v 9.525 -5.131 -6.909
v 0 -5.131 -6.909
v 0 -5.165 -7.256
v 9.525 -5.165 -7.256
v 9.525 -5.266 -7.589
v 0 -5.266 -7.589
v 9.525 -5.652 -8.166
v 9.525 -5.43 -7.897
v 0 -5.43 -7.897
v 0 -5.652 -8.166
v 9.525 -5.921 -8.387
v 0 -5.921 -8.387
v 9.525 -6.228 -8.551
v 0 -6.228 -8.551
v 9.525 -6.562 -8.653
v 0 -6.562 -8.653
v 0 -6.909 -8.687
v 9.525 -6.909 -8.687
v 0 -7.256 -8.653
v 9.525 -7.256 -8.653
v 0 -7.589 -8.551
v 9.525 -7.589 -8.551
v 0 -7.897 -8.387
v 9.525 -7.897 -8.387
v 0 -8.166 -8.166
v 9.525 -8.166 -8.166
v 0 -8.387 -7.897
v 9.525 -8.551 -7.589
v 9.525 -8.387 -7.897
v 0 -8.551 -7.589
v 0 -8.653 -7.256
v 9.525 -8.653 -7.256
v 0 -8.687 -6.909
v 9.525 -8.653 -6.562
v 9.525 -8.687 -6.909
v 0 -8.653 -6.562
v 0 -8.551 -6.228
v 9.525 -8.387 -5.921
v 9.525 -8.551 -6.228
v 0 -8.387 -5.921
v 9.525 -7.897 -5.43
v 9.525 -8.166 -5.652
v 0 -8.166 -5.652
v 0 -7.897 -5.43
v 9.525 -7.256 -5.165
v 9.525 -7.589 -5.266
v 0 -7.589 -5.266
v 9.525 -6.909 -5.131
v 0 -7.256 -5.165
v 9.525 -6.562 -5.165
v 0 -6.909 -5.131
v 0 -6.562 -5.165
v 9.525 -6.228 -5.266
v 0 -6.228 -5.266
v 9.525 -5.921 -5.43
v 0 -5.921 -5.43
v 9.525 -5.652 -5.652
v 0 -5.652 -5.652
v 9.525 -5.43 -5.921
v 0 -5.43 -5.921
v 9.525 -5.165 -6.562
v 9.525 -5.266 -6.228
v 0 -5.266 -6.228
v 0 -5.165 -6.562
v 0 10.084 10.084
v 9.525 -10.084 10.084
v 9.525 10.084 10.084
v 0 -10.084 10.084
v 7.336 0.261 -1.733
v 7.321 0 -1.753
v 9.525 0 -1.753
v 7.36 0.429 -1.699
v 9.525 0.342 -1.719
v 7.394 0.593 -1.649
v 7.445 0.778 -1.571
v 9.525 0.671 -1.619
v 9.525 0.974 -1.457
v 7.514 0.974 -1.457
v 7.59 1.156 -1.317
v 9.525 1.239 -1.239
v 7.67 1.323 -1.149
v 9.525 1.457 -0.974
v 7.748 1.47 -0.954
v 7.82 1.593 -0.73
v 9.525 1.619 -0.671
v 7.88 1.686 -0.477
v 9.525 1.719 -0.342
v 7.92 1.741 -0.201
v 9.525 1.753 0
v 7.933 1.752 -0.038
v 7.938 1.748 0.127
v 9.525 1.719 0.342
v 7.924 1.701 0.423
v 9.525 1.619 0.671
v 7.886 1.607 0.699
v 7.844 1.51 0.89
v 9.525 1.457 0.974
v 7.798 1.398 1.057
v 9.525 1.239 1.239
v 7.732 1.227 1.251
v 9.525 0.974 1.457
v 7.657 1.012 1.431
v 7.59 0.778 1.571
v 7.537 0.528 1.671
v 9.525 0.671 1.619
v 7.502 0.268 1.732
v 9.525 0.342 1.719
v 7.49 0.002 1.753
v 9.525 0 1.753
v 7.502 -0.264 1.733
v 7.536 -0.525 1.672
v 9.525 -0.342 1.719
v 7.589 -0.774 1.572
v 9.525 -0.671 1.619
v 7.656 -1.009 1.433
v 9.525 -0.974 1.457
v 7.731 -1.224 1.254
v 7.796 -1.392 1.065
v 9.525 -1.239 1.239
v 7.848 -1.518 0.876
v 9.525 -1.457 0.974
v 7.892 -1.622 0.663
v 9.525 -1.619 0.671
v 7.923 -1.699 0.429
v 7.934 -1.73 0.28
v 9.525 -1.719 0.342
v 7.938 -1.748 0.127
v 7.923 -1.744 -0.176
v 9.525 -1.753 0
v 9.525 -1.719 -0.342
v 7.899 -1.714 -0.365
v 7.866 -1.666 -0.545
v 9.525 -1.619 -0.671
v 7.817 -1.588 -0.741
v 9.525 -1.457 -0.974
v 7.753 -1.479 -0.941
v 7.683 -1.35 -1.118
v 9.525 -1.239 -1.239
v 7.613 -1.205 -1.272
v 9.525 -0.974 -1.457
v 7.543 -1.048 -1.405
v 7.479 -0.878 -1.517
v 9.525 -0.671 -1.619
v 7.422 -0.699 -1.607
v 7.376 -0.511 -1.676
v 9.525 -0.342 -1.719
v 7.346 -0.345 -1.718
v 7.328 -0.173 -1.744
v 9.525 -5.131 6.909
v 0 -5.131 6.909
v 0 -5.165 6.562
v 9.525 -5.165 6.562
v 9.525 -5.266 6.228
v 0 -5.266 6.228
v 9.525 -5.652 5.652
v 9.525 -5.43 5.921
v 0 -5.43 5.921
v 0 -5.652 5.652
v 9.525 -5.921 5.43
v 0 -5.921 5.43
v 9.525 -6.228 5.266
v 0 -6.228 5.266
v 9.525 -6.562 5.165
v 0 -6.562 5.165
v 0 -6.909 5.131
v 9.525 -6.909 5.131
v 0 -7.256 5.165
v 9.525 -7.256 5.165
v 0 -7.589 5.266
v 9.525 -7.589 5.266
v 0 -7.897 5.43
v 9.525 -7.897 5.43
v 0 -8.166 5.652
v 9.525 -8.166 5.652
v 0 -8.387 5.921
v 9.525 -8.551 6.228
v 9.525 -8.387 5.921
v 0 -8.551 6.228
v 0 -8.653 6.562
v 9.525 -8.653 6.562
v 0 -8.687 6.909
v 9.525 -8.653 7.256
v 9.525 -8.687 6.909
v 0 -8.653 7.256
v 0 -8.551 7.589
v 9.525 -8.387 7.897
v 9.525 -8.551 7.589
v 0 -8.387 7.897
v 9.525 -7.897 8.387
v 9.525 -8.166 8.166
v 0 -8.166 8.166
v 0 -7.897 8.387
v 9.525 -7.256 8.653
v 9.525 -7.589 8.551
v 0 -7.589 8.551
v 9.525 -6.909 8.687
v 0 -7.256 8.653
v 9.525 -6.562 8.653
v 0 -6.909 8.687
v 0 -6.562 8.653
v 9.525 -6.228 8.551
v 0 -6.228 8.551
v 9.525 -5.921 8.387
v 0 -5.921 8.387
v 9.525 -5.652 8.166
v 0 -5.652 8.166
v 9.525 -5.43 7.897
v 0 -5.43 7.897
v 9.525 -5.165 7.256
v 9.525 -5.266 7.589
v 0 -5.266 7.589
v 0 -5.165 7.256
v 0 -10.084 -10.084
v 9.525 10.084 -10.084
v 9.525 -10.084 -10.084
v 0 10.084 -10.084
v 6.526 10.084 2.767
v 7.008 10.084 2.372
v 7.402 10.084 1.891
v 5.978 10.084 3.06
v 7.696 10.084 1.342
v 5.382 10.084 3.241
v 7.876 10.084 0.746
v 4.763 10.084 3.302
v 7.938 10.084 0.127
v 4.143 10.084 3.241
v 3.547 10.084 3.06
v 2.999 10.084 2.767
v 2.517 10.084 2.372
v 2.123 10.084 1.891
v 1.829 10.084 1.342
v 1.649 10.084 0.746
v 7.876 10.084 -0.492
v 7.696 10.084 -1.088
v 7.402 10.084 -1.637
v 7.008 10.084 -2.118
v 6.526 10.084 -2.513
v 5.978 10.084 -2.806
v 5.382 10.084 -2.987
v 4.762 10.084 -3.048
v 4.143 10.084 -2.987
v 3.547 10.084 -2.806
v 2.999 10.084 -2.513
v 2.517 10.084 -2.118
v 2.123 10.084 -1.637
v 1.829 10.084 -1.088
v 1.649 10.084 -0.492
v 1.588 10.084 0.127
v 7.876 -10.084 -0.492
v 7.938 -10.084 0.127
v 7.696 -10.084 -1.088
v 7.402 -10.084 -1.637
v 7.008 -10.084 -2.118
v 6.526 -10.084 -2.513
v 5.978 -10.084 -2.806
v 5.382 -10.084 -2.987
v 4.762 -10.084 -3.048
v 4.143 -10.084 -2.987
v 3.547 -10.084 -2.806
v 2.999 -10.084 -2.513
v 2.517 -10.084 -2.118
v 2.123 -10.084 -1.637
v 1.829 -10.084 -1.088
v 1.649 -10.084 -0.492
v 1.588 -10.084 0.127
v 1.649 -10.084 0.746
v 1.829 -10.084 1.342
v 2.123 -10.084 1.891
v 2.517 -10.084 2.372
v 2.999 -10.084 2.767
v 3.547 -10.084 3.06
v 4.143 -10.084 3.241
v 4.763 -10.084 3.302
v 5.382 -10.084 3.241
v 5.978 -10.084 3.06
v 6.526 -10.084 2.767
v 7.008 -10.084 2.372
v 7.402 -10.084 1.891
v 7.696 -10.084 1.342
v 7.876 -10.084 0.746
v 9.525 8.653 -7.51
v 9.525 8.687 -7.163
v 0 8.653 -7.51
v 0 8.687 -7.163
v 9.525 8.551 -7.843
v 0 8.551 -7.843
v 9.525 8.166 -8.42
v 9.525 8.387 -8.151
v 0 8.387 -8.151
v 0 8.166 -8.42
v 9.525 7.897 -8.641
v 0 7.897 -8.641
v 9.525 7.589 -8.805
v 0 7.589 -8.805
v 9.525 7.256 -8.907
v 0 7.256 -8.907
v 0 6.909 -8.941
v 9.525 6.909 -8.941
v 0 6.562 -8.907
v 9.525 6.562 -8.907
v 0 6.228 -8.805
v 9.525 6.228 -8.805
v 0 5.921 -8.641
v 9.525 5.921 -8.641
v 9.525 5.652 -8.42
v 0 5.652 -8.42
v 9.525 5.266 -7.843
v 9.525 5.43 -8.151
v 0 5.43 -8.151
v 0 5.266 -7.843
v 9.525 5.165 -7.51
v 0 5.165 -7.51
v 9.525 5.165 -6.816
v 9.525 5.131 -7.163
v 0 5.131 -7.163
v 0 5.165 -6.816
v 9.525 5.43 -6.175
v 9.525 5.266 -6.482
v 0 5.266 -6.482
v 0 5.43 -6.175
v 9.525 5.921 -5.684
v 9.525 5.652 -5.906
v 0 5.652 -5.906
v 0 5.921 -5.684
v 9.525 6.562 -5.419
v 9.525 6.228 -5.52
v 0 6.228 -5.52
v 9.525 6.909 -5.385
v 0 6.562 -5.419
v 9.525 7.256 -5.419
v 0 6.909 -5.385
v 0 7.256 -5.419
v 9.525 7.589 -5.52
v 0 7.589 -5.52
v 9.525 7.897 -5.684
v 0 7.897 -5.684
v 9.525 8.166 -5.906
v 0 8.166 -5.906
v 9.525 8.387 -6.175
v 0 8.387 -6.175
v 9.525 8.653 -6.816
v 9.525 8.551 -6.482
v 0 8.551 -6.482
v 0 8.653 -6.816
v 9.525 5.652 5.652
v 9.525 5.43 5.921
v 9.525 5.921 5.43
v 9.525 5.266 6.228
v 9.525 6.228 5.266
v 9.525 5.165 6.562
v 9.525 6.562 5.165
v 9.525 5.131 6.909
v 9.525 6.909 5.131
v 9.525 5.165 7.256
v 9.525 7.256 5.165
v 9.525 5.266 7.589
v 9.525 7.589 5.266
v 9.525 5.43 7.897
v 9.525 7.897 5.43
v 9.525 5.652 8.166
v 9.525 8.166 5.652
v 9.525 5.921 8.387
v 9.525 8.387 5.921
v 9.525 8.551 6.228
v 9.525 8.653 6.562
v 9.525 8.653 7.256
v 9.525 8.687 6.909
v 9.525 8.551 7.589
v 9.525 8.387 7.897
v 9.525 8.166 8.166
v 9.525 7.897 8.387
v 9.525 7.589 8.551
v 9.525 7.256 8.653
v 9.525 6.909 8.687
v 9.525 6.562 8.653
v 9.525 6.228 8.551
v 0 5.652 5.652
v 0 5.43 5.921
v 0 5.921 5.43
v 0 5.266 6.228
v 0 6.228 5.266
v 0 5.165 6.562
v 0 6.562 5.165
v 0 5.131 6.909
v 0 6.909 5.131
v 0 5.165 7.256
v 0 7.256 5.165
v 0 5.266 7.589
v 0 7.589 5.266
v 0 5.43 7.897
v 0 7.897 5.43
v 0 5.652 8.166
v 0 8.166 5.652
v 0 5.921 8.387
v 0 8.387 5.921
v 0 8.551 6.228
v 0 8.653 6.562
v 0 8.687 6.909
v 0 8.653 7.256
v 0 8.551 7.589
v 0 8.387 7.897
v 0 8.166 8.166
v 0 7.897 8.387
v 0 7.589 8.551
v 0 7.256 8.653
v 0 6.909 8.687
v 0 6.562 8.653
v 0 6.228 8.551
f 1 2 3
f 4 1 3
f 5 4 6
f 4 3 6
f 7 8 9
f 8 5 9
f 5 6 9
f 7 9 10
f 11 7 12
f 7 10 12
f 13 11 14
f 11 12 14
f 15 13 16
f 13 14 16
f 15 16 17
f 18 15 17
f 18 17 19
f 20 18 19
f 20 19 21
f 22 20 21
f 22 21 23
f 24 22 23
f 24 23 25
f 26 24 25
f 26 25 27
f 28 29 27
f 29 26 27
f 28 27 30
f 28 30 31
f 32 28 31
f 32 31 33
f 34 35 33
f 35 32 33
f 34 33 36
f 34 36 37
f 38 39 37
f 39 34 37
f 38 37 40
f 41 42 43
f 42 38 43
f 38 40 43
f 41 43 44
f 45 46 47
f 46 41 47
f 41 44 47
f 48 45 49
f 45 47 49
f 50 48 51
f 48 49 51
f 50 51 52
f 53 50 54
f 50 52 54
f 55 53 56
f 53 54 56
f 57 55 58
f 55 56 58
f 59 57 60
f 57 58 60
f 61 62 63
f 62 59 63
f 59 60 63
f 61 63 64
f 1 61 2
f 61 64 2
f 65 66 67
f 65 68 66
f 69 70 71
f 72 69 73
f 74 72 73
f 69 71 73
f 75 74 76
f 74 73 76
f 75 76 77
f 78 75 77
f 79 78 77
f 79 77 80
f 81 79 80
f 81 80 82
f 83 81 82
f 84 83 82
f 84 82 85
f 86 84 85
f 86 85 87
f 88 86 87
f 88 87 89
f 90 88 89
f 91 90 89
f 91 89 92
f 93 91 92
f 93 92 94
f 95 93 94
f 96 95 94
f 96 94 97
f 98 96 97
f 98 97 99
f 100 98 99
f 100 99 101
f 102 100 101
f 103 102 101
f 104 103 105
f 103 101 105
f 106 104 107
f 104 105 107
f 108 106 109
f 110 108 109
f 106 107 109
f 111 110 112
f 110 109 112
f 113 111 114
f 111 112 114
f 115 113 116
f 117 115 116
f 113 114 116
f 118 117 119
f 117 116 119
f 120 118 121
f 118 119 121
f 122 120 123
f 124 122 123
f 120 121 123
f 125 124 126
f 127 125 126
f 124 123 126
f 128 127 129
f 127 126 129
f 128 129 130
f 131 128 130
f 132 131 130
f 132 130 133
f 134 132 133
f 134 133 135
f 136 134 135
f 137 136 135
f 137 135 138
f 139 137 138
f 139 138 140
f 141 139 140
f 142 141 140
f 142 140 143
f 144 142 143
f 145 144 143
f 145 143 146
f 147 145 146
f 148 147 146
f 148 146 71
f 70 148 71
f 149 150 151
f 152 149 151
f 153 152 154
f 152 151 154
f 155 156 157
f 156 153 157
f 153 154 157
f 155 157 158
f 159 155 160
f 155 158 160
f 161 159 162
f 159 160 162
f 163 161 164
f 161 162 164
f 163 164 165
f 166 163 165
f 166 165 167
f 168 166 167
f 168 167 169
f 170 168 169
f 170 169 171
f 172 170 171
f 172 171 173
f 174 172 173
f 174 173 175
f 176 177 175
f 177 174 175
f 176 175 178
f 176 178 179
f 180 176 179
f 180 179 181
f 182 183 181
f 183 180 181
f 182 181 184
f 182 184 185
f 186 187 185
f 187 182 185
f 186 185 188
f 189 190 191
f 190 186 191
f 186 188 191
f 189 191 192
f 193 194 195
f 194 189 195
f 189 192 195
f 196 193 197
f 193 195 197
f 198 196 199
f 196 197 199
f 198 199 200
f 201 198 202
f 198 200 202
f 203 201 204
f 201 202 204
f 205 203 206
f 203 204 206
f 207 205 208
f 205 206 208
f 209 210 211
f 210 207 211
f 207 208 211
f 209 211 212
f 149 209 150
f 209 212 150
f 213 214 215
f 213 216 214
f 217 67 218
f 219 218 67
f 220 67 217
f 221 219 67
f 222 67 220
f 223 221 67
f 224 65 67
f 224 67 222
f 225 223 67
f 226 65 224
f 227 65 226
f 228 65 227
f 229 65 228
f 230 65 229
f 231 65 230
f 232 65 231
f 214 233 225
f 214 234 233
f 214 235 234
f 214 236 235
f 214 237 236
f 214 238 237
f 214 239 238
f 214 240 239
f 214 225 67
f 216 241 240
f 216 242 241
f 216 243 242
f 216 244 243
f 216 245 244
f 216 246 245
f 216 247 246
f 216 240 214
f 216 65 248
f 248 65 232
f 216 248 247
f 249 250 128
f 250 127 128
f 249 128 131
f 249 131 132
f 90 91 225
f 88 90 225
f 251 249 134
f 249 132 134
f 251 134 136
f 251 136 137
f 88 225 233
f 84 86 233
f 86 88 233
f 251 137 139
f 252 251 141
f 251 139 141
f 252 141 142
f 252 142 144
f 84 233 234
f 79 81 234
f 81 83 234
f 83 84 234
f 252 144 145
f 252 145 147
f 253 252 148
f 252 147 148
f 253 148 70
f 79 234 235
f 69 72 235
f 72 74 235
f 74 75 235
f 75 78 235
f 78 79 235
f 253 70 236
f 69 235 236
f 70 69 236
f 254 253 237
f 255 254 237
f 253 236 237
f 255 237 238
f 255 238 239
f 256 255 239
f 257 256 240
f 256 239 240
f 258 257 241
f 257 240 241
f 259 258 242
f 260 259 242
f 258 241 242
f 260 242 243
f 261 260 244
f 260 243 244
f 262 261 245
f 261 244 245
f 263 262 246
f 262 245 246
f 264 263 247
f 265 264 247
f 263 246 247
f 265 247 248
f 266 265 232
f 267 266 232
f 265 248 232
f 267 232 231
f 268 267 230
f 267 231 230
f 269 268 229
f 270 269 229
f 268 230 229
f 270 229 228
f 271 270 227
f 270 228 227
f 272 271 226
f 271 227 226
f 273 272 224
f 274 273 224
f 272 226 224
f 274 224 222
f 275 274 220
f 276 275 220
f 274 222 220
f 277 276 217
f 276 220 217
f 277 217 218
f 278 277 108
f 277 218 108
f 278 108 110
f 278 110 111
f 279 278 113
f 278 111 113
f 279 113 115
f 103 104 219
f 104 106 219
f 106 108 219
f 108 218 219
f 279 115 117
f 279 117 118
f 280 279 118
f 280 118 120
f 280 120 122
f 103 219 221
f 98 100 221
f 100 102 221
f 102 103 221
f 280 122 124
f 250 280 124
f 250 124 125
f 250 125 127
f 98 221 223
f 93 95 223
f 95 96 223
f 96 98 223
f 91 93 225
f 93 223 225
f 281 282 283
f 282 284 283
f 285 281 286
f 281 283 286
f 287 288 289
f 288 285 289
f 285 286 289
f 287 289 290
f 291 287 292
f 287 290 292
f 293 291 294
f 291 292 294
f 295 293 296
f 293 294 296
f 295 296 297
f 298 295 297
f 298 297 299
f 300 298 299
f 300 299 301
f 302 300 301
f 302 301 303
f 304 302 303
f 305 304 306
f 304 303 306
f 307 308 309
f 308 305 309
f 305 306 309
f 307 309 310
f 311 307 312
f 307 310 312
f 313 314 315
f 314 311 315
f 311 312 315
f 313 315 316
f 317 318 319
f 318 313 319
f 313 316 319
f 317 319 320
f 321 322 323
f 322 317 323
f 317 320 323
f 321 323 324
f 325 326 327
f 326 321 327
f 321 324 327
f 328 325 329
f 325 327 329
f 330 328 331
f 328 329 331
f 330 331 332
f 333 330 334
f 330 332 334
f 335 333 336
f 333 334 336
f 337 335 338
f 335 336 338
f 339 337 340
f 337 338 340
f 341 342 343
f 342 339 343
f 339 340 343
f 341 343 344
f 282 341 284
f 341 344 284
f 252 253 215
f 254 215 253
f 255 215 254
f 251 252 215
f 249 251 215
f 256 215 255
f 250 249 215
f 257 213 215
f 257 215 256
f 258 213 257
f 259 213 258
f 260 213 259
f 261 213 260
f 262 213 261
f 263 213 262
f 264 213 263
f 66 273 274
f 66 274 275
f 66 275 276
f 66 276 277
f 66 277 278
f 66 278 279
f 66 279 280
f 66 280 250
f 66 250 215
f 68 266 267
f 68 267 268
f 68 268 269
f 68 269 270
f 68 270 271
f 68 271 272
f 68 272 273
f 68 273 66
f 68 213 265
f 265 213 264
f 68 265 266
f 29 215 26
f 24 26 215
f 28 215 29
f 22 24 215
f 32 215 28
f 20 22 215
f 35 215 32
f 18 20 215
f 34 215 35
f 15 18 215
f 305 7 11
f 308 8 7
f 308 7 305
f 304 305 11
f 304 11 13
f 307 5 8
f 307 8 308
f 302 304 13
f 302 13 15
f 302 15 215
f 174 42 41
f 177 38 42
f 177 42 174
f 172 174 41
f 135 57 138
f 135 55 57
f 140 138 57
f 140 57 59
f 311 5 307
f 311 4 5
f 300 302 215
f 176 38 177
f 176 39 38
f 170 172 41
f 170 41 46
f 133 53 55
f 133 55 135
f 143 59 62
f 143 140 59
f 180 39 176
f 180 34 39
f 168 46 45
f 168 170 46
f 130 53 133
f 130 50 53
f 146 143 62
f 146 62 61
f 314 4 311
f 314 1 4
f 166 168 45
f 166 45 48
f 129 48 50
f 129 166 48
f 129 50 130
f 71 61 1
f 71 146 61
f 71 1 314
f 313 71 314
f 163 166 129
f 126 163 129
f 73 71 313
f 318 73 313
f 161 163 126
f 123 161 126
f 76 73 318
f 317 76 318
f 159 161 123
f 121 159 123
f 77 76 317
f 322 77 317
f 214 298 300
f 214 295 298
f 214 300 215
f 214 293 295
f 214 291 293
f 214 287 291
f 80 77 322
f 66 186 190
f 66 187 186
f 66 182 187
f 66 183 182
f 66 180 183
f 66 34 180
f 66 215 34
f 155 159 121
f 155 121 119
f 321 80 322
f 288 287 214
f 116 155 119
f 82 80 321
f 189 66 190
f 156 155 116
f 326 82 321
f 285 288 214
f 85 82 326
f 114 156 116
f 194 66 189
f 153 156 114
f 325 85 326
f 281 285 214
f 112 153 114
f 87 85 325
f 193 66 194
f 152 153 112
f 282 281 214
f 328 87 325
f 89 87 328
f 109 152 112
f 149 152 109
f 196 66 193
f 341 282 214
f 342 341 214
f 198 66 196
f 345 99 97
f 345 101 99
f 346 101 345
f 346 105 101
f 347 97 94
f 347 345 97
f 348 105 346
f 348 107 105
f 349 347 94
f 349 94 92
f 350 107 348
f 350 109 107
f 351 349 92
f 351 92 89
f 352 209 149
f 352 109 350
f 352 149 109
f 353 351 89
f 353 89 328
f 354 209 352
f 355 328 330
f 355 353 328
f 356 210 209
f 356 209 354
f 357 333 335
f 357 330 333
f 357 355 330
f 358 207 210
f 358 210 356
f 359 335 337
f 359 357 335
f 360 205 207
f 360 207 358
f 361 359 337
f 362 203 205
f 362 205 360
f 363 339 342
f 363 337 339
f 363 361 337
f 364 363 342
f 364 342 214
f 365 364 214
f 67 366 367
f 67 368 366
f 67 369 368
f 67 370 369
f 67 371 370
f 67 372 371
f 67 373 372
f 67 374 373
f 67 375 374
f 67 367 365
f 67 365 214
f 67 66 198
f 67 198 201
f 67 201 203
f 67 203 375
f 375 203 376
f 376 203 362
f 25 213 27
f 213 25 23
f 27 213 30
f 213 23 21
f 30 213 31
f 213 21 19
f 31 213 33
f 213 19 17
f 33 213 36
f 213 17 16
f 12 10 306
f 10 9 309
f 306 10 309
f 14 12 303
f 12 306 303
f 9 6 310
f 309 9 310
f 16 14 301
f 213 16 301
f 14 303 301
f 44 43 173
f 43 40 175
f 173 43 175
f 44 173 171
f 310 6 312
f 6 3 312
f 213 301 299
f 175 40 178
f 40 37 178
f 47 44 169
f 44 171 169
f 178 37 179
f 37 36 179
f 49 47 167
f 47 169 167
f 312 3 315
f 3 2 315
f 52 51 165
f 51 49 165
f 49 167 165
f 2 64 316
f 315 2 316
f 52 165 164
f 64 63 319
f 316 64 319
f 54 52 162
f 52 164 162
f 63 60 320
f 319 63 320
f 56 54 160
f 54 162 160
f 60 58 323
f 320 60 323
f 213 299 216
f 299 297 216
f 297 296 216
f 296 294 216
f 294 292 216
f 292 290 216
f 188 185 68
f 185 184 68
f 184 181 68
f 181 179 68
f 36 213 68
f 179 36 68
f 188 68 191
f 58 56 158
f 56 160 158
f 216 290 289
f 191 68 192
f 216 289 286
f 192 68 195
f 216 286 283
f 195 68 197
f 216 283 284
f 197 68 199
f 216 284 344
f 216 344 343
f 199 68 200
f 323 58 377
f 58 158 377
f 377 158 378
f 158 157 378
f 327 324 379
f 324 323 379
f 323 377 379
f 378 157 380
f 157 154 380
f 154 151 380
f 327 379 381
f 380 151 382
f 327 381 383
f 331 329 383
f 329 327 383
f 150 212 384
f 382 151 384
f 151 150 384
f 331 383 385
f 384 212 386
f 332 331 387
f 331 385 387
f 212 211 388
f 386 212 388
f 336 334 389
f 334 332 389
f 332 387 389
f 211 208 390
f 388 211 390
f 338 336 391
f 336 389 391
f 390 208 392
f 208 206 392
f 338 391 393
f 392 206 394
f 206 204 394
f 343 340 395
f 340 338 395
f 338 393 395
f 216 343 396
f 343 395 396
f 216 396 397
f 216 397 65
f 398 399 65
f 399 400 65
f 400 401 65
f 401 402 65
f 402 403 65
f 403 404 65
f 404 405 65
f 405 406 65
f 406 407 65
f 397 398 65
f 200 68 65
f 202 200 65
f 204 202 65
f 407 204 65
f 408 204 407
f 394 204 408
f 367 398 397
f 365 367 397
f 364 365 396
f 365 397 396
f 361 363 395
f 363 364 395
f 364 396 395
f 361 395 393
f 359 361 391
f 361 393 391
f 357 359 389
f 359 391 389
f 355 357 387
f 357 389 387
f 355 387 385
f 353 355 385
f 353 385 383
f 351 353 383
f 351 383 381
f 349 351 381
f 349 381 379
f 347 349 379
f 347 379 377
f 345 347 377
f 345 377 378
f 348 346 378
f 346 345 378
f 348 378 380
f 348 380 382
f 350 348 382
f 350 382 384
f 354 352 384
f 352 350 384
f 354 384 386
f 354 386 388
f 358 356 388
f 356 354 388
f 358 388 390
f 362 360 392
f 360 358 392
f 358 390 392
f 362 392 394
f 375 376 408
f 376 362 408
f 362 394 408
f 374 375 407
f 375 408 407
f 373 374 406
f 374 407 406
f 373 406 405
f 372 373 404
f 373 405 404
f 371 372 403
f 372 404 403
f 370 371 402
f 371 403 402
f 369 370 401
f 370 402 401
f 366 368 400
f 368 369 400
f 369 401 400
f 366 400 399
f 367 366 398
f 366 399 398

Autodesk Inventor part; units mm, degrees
ref_plane "YZ Plane" through (0, 0, 0) normal (1, 0, 0) x (0, 1, 0)
ref_plane "XZ Plane" through (0, 0, 0) normal (0, 1, 0) x (-1, 0, 0)
ref_plane "XY Plane" through (0, 0, 0) normal (0, 0, 1) x (1, 0, 0)
sketch "Sketch1" plane through (0, 0, 0) normal (1, 0, 0) x (0, 1, 0)
  circle A0 centre (-6.9088, 6.9088) radius 1.778
  circle A1 centre (6.9088, 6.9088) radius 1.778
  circle A2 centre (-6.9088, -6.9088) radius 1.778
  circle A3 centre (6.9088, -7.1628) radius 1.778
  line L0 (-10.0838, 10.0838) -> (10.0838, 10.0838)
  line L1 (10.0838, 10.0838) -> (10.0838, -10.0838)
  line L2 (10.0838, -10.0838) -> (-10.0838, -10.0838)
  line L3 (-10.0838, -10.0838) -> (-10.0838, 10.0838)
  point P0 (0, 0)
  dimension "d0" = 6.9088
  dimension "d1" = 6.9088
  dimension "d2" = 13.8176
  dimension "d3" = 13.8176
  dimension "d4" = 3.556
  dimension "d5" = 3.556
  dimension "d6" = 3.556
  dimension "d7" = 3.556
  dimension "d8" = 3.175
  dimension "d9" = 3.175
  dimension "d10" = 3.175
  dimension "d11" = 3.175
extrude "Extrusion1" add sketch "Sketch1" along normal blind 9.525
sketch "Sketch2" plane through (0, 10.0838, 10.0838) normal (0, 1, 0) x (1, 0, 0)
  circle A0 centre (4.7625, 9.9568) radius 3.175
  line L0 (0, 0) -> (0, 20.1676) projected
  line L1 (0, 20.1676) -> (9.525, 20.1676) projected
  point P0 (0, 10.0838)
  dimension "d14" = 6.35
  dimension "d17" = 4.7625
  dimension "d18" = 10.2108
extrude "Extrusion2" cut sketch "Sketch2" against normal blind 38.1
sketch "Sketch3" plane through (9.525, 0, 0) normal (1, 0, 0) x (0, 0, -1)
  circle A0 centre (0, 0) radius 1.7526
  dimension "d19" = 3.5052
extrude "Extrusion3" cut sketch "Sketch3" against normal blind 4.7625
properties part number "Tube Bracket"
